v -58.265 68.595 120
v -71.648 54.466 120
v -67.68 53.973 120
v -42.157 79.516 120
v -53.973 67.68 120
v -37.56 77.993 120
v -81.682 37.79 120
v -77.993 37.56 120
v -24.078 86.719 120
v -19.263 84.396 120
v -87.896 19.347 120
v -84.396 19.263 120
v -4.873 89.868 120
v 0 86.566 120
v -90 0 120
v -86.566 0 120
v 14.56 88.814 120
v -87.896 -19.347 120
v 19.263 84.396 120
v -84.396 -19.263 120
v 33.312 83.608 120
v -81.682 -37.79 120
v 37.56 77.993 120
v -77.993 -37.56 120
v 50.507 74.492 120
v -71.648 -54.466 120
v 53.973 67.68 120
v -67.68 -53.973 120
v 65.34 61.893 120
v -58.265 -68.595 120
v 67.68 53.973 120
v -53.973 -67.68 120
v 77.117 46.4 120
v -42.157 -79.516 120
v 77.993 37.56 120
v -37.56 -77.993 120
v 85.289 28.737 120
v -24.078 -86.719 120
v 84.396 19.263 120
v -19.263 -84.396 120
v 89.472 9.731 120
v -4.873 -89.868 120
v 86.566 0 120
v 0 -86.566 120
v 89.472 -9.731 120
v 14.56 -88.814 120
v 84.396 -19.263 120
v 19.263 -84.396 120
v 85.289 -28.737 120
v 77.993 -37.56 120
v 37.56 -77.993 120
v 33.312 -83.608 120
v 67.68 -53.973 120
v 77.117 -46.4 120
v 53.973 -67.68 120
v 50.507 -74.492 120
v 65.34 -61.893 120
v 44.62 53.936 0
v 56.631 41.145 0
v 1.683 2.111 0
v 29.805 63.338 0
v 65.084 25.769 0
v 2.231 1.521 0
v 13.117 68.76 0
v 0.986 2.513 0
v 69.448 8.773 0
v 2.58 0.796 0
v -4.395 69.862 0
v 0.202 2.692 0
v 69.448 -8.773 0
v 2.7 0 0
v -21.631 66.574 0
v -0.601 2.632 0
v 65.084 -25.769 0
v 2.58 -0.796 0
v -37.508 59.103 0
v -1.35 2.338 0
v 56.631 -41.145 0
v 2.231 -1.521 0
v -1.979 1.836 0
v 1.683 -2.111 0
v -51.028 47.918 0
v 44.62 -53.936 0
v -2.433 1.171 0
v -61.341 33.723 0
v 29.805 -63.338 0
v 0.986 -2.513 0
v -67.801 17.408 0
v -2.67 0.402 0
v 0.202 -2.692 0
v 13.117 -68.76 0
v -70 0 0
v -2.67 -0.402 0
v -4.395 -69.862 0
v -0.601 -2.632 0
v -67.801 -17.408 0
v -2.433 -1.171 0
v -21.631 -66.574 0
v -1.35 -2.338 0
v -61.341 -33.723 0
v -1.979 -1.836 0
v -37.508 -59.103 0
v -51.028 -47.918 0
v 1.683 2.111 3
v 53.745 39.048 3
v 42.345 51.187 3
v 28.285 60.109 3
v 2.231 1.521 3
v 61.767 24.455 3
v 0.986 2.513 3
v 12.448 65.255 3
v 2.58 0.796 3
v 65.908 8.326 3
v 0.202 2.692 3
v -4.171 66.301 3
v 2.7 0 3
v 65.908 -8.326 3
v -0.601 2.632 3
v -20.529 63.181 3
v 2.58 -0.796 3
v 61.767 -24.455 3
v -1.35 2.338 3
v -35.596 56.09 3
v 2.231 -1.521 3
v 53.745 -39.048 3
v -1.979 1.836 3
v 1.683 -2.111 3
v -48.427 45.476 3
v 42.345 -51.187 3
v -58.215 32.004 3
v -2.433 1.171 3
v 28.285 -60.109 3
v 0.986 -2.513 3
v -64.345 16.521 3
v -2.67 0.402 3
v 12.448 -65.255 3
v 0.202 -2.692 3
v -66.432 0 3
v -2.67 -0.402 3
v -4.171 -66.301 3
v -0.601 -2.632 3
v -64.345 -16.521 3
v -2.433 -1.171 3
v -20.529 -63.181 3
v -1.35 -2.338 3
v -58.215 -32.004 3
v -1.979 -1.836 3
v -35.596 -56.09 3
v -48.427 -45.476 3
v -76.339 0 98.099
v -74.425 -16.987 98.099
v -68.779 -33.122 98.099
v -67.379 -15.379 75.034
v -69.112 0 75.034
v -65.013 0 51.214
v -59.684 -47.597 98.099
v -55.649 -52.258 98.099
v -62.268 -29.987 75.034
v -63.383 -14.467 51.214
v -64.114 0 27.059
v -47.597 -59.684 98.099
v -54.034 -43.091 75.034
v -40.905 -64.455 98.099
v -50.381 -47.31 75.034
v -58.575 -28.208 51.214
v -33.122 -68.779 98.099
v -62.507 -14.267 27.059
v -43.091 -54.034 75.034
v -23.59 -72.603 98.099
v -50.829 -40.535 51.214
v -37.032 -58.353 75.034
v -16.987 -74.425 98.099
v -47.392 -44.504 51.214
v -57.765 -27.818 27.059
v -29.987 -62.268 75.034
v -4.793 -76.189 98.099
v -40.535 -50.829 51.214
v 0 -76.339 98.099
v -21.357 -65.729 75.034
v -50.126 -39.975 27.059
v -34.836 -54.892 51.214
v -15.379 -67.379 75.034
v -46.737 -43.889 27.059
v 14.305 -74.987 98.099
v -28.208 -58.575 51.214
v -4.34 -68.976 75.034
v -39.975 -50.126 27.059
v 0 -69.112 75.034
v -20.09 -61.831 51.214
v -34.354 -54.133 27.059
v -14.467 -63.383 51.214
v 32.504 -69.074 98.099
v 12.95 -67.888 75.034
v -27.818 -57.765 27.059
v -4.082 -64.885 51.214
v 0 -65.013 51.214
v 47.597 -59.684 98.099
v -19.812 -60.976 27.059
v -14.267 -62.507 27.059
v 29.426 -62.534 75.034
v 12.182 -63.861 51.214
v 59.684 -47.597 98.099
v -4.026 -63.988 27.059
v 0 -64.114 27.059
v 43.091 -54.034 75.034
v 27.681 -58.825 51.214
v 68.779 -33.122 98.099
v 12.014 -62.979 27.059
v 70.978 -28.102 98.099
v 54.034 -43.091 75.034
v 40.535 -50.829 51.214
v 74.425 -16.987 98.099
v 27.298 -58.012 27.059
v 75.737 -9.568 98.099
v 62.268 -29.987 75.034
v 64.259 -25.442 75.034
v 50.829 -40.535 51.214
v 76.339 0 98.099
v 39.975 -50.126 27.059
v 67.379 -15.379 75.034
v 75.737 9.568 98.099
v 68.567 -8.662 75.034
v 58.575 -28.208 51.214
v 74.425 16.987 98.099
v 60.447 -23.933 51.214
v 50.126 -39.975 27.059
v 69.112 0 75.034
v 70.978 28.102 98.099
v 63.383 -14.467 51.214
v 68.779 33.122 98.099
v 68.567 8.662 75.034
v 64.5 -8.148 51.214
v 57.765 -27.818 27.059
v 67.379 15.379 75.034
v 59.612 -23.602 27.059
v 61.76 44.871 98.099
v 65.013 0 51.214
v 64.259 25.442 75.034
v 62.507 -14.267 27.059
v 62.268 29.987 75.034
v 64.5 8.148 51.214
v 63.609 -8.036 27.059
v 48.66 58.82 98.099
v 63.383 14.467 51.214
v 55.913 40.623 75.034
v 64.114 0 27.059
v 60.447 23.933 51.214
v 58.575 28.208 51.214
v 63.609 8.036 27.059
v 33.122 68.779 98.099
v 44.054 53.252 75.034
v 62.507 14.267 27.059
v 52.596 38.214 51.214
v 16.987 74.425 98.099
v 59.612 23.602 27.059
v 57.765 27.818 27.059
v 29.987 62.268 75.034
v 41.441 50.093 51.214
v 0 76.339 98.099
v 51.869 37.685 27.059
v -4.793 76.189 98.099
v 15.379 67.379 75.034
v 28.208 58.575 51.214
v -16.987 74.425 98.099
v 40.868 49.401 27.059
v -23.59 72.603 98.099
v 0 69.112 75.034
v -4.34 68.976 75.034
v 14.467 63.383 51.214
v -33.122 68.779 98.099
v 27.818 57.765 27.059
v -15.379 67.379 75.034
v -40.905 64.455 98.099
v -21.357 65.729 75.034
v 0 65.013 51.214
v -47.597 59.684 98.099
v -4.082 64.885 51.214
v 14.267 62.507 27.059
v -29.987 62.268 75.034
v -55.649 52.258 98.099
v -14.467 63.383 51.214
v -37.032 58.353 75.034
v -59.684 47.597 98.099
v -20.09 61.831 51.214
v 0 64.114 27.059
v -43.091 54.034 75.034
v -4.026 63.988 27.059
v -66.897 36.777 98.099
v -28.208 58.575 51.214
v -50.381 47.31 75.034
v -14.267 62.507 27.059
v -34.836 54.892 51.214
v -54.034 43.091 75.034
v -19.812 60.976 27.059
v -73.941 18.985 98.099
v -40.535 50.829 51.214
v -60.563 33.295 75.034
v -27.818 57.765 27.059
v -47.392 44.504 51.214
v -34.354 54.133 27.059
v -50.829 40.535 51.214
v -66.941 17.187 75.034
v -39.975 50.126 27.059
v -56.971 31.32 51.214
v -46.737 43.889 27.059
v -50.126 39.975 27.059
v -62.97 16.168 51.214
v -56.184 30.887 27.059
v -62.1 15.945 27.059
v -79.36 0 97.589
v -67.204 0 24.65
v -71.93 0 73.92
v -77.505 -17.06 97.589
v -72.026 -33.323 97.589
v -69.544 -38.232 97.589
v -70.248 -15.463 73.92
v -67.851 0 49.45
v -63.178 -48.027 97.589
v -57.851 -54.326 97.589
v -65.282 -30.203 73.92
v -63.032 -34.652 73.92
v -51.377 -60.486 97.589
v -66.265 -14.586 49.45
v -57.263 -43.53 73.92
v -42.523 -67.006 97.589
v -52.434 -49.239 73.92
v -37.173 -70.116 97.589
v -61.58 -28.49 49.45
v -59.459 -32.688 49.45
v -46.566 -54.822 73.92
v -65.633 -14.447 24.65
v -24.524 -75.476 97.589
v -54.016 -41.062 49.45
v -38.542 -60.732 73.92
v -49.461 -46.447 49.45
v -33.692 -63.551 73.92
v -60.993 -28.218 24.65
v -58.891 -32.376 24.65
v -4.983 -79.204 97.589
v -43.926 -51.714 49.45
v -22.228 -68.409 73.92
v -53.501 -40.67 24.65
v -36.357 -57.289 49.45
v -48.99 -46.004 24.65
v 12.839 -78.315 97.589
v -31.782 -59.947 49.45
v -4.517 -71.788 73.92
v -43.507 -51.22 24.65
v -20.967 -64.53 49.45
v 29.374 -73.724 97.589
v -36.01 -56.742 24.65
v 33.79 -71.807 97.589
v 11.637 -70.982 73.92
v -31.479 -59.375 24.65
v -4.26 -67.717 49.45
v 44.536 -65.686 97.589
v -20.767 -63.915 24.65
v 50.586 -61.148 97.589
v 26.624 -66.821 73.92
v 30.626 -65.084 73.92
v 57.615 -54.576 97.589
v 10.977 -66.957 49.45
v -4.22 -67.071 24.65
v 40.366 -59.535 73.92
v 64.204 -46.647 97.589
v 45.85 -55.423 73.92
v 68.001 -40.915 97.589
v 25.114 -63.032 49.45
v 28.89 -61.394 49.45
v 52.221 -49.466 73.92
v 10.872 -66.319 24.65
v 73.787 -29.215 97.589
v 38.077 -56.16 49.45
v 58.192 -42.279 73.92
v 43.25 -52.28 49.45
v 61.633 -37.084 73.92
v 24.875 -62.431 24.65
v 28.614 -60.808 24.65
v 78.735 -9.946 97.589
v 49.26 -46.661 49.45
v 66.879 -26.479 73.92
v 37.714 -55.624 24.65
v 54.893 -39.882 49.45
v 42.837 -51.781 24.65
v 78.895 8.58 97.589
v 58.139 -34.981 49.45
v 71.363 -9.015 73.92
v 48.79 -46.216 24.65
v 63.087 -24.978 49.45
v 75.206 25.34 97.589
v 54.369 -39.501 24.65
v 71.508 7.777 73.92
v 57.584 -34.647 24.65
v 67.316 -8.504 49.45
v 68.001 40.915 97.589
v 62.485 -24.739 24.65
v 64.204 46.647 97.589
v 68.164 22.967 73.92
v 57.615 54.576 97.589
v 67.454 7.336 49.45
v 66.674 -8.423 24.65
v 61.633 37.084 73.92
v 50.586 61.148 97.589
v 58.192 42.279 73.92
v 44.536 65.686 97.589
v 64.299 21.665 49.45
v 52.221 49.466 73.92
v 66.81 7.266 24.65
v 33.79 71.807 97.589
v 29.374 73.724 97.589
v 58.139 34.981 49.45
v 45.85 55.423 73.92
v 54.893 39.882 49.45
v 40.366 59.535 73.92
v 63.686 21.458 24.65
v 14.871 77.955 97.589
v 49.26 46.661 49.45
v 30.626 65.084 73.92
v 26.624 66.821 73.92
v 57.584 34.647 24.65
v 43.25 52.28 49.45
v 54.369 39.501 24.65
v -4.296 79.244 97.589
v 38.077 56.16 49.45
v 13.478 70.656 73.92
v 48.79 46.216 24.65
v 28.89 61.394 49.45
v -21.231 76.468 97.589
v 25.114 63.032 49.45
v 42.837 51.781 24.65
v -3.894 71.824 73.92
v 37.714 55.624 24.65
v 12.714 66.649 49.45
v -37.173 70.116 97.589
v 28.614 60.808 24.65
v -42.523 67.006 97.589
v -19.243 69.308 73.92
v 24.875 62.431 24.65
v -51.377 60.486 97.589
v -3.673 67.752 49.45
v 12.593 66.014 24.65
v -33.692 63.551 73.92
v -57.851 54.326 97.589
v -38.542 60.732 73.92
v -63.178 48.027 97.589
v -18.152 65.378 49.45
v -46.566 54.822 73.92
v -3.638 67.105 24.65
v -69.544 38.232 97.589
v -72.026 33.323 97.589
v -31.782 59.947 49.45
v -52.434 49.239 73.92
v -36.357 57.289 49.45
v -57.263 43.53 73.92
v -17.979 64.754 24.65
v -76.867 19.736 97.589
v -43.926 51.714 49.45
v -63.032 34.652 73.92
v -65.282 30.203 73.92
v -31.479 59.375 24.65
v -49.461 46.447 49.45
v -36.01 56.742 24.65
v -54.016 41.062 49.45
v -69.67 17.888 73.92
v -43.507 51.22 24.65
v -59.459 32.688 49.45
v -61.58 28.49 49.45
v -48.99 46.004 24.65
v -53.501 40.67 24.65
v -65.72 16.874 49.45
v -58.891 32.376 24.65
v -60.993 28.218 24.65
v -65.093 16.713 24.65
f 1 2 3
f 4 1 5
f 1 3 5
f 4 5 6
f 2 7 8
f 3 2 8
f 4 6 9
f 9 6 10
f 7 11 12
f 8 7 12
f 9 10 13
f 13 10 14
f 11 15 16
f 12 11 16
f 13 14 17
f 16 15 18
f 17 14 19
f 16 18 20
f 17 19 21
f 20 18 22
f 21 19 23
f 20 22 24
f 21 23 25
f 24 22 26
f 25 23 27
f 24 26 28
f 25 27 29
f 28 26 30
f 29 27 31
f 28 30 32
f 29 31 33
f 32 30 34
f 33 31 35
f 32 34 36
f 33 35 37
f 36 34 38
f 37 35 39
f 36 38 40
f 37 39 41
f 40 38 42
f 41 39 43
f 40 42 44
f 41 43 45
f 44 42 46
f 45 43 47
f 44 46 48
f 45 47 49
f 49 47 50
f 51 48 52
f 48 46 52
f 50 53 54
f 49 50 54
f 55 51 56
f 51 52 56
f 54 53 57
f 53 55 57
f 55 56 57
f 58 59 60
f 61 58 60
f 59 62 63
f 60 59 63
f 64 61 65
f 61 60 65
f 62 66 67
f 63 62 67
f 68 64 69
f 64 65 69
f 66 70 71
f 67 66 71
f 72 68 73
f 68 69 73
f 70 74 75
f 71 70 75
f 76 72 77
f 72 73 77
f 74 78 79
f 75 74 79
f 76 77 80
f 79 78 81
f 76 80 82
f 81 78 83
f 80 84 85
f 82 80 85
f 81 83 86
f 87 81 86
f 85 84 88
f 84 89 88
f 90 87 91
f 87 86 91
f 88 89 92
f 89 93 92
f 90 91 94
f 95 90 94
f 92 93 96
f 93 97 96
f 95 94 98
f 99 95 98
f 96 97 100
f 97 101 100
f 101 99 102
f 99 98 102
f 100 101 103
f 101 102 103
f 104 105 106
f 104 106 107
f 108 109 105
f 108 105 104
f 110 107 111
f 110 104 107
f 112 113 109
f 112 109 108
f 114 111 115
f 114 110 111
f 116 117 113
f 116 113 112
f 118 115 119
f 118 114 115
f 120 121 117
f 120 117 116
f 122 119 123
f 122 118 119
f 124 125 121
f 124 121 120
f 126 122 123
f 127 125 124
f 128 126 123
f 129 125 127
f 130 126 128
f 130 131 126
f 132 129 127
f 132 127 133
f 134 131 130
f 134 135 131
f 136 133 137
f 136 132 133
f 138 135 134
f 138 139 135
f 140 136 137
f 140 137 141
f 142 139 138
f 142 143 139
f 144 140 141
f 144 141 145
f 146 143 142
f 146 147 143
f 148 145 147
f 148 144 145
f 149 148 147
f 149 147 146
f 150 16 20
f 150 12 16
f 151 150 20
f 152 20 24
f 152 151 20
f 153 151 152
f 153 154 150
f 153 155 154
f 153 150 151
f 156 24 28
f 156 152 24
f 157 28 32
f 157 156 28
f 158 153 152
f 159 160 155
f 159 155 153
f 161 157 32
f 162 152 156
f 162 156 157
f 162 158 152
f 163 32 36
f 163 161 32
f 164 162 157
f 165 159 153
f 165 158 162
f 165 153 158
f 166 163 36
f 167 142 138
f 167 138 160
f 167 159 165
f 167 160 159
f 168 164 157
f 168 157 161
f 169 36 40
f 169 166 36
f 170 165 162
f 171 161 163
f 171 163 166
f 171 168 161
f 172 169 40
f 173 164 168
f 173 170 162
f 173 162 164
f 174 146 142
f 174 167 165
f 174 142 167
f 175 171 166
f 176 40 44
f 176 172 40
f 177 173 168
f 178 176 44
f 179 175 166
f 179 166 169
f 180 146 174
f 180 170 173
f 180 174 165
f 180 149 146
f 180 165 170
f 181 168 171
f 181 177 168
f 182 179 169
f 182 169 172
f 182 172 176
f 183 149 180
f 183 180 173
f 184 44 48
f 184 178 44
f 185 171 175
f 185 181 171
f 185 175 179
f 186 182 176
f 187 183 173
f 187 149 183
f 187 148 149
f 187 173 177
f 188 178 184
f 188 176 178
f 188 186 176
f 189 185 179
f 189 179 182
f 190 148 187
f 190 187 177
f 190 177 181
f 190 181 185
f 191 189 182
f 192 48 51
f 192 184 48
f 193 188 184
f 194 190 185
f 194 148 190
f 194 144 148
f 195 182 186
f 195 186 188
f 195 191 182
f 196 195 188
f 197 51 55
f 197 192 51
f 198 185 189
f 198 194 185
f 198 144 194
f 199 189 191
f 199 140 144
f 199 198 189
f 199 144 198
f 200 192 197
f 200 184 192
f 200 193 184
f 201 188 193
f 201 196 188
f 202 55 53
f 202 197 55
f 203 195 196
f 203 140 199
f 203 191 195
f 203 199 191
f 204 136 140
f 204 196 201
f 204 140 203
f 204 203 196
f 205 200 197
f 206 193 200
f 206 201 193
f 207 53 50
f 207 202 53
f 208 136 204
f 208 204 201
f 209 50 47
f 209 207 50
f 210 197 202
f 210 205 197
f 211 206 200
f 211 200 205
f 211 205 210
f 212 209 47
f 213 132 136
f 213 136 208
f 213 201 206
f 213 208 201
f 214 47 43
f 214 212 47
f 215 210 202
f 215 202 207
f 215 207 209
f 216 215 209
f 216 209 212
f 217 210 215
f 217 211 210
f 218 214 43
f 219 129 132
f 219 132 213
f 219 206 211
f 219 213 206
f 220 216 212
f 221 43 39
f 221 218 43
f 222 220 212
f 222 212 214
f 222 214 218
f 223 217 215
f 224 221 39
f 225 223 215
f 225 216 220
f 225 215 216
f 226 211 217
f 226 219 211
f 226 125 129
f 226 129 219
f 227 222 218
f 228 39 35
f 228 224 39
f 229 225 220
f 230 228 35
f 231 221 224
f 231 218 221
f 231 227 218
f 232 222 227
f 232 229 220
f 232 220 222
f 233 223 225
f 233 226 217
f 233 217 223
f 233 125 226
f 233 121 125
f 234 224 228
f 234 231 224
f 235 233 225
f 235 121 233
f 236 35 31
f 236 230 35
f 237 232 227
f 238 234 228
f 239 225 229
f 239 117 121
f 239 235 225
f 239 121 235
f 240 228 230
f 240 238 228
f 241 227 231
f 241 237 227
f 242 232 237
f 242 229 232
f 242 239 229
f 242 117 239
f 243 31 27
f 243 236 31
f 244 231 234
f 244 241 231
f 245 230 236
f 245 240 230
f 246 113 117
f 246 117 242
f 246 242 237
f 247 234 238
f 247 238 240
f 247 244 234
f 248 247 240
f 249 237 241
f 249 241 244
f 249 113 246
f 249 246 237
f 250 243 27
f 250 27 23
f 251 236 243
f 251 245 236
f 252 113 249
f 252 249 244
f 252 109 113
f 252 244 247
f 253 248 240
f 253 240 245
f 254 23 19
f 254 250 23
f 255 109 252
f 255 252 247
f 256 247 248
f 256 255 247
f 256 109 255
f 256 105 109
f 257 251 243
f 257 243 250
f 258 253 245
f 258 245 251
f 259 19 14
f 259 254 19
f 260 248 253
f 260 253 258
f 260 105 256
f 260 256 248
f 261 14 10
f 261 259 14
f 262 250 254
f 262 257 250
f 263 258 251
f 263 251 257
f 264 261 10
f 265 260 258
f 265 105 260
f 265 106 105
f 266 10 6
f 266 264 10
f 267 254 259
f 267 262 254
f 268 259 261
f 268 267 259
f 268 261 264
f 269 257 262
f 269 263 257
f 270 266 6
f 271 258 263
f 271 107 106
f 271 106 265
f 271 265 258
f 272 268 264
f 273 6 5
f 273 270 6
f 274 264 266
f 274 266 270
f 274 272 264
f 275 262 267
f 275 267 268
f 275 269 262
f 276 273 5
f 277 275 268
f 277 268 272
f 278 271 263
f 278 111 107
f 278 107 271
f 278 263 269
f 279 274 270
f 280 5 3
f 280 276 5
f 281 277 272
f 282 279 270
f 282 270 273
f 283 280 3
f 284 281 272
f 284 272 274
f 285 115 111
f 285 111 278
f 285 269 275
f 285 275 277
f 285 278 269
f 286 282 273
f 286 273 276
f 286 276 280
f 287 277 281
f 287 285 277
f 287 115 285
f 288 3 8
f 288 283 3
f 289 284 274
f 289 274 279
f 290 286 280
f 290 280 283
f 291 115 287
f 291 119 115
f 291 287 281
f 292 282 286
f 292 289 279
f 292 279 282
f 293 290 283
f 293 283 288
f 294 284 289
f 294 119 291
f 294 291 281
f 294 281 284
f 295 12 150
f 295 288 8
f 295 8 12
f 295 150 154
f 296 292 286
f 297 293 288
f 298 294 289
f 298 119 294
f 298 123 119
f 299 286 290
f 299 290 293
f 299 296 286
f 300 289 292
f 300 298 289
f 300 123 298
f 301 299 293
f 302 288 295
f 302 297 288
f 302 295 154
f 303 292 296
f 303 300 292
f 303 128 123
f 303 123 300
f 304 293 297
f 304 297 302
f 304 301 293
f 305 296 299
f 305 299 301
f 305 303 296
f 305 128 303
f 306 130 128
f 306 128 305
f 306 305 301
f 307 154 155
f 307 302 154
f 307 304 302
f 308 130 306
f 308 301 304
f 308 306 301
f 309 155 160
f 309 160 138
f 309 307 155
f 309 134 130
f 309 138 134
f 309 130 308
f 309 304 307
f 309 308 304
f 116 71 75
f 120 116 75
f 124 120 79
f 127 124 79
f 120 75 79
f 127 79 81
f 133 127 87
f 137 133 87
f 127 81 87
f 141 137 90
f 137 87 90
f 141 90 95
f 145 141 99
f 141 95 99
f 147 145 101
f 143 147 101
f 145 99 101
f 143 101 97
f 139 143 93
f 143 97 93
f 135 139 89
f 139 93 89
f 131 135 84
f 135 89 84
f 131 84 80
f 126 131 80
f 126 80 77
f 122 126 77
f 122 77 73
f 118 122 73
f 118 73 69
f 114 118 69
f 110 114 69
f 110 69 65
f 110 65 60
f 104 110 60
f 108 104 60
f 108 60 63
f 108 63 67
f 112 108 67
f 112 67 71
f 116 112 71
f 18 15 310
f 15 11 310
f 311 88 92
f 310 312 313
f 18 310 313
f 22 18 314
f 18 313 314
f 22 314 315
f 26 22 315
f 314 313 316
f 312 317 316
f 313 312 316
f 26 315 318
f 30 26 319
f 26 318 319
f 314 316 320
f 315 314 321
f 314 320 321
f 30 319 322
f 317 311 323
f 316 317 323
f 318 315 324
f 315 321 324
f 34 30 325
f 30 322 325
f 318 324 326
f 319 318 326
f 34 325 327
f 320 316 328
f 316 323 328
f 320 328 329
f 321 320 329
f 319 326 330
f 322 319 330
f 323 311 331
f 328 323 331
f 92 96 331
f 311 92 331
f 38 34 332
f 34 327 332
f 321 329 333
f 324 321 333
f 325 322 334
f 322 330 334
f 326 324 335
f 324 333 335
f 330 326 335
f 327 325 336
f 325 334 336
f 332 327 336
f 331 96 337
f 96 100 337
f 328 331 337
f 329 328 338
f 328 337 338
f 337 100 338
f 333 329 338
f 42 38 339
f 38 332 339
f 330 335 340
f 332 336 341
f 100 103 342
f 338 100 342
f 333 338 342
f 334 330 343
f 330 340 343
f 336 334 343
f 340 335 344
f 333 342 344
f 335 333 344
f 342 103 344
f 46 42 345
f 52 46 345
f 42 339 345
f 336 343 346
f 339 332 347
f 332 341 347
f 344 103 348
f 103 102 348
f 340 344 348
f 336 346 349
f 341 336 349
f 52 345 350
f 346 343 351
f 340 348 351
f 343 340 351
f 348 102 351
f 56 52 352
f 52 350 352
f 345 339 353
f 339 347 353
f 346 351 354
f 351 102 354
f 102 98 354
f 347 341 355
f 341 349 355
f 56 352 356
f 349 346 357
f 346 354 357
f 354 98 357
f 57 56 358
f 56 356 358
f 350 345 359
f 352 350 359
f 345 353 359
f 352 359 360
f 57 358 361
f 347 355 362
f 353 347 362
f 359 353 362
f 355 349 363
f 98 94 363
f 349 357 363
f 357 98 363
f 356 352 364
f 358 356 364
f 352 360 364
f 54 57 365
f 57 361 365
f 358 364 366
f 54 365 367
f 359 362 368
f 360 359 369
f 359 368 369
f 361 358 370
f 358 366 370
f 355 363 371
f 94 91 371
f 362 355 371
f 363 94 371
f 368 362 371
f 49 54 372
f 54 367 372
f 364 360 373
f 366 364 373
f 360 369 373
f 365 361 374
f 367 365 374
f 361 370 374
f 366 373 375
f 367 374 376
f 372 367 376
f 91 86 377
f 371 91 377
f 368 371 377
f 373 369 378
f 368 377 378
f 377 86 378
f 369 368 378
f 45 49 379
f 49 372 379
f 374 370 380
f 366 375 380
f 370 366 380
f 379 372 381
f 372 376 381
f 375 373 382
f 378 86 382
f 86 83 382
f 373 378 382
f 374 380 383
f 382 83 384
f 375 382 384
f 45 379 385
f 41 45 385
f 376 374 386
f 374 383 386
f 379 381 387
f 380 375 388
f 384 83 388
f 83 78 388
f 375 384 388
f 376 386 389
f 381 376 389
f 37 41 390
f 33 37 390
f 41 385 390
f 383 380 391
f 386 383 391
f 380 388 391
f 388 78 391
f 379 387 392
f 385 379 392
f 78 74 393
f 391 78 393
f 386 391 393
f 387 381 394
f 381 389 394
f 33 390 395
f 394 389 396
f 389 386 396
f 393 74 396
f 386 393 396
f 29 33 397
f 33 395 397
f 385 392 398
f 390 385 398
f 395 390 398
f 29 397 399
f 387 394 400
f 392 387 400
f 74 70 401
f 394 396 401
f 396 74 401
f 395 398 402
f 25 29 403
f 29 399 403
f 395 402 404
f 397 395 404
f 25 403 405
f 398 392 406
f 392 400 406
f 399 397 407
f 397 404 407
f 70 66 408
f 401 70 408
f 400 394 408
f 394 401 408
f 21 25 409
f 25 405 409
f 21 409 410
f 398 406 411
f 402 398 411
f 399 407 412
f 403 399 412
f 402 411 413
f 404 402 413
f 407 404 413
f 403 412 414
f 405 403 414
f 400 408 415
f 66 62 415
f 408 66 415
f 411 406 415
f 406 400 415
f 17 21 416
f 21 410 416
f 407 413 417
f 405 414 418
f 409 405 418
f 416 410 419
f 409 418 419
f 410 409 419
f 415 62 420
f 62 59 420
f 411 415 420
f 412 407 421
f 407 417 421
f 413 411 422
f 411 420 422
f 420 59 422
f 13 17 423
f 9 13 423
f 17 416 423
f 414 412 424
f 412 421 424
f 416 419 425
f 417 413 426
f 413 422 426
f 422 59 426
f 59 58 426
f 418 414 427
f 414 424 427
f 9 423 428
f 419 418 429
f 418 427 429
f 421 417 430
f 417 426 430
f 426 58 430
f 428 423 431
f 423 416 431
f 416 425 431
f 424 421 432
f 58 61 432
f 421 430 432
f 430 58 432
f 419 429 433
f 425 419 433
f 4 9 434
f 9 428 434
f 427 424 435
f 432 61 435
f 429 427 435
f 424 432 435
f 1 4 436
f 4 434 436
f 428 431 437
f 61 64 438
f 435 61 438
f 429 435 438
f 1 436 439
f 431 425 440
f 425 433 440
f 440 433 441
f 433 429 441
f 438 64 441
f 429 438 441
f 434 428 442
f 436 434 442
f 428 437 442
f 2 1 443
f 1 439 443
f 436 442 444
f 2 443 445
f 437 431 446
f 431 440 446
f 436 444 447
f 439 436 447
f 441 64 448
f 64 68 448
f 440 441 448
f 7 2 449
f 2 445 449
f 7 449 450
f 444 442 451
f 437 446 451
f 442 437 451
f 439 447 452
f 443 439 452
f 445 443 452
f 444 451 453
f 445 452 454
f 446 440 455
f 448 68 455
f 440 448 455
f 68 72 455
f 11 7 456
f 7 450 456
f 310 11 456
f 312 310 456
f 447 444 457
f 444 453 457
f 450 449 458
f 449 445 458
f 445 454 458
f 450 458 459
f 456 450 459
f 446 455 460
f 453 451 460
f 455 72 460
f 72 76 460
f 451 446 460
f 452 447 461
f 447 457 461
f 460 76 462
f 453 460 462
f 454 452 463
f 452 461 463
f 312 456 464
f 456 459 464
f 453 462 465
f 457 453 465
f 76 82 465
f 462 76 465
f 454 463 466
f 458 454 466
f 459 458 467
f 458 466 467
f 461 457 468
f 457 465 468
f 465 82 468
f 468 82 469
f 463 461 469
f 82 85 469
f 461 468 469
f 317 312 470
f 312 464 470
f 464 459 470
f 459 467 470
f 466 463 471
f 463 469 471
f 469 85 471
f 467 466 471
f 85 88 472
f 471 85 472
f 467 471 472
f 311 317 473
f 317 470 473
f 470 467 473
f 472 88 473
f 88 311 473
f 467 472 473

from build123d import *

# Parameters (mm, degrees)
F2_T     = -3
F3_R     = 2.7
F4_DEPTH = 25


with BuildPart() as f1:
    # F0 (on Front) → F1 (revolve)
    with BuildSketch(Plane.XZ):
        with BuildLine():
            Line((-70, 0), (0, 0))
            Line((0, 0), (0, 120))
            Line((0, 120), (-90, 120))
            ThreePointArc((-90, 120), (-69.464997, 61.755834), (-70, 0))
        make_face()
    revolve(axis=Axis((0, 0, 60), (0, 0, 1)))

    # F2
    f2_openings = [f1.faces().sort_by_distance(p)[0] for p in [
        (0, 0, 120),
    ]]
    offset(amount=F2_T, openings=f2_openings)

    # F3 (on face) → F4 (cut)
    with BuildSketch(Plane(origin=(0, 0, 0), x_dir=(1, 0, 0), z_dir=(0, 0, -1))):
        Circle(F3_R)
    extrude(amount=-F4_DEPTH, mode=Mode.SUBTRACT)


solid = f1.part
